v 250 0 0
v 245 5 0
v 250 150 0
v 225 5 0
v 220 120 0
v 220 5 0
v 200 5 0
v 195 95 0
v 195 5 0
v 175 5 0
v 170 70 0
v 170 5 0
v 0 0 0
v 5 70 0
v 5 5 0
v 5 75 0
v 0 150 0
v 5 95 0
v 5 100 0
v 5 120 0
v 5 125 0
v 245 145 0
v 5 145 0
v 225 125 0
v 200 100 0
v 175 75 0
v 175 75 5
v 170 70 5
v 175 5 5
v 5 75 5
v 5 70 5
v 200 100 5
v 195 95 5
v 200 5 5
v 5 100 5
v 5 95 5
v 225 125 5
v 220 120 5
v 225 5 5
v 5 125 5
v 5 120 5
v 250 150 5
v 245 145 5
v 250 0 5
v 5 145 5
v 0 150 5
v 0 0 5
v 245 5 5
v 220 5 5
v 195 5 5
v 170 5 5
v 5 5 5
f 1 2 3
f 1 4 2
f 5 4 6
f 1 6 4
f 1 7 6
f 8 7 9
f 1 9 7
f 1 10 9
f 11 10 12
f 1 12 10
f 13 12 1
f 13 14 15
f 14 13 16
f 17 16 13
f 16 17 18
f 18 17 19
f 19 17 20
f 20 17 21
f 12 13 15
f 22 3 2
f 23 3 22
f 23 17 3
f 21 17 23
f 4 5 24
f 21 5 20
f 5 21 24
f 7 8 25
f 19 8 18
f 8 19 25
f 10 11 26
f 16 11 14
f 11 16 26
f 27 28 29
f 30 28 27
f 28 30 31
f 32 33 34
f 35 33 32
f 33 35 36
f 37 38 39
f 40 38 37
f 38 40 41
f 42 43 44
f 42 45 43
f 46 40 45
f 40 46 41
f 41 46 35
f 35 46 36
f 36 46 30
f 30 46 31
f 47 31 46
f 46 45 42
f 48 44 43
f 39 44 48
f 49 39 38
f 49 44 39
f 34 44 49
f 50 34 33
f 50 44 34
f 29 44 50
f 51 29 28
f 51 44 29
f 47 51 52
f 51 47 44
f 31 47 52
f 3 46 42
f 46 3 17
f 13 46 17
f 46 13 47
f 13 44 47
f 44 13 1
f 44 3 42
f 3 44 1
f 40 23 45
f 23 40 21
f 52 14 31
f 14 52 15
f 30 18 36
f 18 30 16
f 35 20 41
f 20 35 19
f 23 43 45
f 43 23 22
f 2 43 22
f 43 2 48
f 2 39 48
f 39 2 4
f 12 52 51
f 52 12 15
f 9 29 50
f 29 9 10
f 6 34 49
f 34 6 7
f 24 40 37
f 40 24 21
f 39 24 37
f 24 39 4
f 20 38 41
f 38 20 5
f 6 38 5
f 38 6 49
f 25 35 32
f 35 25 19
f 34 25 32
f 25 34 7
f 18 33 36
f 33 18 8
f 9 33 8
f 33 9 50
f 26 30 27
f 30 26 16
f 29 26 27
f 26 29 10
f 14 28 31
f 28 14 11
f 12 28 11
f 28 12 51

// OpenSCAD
module frame(width, height, thickness) {
	linear_extrude(height=5) {
		difference() {
			square([width, height]);
			translate([thickness, thickness]) {
				square([width - thickness * 2, height - thickness * 2]);
			}
		}
	}
}

frame(250, 150, 5);
frame(225, 125, 5);
frame(200, 100, 5);
frame(175, 75, 5);
